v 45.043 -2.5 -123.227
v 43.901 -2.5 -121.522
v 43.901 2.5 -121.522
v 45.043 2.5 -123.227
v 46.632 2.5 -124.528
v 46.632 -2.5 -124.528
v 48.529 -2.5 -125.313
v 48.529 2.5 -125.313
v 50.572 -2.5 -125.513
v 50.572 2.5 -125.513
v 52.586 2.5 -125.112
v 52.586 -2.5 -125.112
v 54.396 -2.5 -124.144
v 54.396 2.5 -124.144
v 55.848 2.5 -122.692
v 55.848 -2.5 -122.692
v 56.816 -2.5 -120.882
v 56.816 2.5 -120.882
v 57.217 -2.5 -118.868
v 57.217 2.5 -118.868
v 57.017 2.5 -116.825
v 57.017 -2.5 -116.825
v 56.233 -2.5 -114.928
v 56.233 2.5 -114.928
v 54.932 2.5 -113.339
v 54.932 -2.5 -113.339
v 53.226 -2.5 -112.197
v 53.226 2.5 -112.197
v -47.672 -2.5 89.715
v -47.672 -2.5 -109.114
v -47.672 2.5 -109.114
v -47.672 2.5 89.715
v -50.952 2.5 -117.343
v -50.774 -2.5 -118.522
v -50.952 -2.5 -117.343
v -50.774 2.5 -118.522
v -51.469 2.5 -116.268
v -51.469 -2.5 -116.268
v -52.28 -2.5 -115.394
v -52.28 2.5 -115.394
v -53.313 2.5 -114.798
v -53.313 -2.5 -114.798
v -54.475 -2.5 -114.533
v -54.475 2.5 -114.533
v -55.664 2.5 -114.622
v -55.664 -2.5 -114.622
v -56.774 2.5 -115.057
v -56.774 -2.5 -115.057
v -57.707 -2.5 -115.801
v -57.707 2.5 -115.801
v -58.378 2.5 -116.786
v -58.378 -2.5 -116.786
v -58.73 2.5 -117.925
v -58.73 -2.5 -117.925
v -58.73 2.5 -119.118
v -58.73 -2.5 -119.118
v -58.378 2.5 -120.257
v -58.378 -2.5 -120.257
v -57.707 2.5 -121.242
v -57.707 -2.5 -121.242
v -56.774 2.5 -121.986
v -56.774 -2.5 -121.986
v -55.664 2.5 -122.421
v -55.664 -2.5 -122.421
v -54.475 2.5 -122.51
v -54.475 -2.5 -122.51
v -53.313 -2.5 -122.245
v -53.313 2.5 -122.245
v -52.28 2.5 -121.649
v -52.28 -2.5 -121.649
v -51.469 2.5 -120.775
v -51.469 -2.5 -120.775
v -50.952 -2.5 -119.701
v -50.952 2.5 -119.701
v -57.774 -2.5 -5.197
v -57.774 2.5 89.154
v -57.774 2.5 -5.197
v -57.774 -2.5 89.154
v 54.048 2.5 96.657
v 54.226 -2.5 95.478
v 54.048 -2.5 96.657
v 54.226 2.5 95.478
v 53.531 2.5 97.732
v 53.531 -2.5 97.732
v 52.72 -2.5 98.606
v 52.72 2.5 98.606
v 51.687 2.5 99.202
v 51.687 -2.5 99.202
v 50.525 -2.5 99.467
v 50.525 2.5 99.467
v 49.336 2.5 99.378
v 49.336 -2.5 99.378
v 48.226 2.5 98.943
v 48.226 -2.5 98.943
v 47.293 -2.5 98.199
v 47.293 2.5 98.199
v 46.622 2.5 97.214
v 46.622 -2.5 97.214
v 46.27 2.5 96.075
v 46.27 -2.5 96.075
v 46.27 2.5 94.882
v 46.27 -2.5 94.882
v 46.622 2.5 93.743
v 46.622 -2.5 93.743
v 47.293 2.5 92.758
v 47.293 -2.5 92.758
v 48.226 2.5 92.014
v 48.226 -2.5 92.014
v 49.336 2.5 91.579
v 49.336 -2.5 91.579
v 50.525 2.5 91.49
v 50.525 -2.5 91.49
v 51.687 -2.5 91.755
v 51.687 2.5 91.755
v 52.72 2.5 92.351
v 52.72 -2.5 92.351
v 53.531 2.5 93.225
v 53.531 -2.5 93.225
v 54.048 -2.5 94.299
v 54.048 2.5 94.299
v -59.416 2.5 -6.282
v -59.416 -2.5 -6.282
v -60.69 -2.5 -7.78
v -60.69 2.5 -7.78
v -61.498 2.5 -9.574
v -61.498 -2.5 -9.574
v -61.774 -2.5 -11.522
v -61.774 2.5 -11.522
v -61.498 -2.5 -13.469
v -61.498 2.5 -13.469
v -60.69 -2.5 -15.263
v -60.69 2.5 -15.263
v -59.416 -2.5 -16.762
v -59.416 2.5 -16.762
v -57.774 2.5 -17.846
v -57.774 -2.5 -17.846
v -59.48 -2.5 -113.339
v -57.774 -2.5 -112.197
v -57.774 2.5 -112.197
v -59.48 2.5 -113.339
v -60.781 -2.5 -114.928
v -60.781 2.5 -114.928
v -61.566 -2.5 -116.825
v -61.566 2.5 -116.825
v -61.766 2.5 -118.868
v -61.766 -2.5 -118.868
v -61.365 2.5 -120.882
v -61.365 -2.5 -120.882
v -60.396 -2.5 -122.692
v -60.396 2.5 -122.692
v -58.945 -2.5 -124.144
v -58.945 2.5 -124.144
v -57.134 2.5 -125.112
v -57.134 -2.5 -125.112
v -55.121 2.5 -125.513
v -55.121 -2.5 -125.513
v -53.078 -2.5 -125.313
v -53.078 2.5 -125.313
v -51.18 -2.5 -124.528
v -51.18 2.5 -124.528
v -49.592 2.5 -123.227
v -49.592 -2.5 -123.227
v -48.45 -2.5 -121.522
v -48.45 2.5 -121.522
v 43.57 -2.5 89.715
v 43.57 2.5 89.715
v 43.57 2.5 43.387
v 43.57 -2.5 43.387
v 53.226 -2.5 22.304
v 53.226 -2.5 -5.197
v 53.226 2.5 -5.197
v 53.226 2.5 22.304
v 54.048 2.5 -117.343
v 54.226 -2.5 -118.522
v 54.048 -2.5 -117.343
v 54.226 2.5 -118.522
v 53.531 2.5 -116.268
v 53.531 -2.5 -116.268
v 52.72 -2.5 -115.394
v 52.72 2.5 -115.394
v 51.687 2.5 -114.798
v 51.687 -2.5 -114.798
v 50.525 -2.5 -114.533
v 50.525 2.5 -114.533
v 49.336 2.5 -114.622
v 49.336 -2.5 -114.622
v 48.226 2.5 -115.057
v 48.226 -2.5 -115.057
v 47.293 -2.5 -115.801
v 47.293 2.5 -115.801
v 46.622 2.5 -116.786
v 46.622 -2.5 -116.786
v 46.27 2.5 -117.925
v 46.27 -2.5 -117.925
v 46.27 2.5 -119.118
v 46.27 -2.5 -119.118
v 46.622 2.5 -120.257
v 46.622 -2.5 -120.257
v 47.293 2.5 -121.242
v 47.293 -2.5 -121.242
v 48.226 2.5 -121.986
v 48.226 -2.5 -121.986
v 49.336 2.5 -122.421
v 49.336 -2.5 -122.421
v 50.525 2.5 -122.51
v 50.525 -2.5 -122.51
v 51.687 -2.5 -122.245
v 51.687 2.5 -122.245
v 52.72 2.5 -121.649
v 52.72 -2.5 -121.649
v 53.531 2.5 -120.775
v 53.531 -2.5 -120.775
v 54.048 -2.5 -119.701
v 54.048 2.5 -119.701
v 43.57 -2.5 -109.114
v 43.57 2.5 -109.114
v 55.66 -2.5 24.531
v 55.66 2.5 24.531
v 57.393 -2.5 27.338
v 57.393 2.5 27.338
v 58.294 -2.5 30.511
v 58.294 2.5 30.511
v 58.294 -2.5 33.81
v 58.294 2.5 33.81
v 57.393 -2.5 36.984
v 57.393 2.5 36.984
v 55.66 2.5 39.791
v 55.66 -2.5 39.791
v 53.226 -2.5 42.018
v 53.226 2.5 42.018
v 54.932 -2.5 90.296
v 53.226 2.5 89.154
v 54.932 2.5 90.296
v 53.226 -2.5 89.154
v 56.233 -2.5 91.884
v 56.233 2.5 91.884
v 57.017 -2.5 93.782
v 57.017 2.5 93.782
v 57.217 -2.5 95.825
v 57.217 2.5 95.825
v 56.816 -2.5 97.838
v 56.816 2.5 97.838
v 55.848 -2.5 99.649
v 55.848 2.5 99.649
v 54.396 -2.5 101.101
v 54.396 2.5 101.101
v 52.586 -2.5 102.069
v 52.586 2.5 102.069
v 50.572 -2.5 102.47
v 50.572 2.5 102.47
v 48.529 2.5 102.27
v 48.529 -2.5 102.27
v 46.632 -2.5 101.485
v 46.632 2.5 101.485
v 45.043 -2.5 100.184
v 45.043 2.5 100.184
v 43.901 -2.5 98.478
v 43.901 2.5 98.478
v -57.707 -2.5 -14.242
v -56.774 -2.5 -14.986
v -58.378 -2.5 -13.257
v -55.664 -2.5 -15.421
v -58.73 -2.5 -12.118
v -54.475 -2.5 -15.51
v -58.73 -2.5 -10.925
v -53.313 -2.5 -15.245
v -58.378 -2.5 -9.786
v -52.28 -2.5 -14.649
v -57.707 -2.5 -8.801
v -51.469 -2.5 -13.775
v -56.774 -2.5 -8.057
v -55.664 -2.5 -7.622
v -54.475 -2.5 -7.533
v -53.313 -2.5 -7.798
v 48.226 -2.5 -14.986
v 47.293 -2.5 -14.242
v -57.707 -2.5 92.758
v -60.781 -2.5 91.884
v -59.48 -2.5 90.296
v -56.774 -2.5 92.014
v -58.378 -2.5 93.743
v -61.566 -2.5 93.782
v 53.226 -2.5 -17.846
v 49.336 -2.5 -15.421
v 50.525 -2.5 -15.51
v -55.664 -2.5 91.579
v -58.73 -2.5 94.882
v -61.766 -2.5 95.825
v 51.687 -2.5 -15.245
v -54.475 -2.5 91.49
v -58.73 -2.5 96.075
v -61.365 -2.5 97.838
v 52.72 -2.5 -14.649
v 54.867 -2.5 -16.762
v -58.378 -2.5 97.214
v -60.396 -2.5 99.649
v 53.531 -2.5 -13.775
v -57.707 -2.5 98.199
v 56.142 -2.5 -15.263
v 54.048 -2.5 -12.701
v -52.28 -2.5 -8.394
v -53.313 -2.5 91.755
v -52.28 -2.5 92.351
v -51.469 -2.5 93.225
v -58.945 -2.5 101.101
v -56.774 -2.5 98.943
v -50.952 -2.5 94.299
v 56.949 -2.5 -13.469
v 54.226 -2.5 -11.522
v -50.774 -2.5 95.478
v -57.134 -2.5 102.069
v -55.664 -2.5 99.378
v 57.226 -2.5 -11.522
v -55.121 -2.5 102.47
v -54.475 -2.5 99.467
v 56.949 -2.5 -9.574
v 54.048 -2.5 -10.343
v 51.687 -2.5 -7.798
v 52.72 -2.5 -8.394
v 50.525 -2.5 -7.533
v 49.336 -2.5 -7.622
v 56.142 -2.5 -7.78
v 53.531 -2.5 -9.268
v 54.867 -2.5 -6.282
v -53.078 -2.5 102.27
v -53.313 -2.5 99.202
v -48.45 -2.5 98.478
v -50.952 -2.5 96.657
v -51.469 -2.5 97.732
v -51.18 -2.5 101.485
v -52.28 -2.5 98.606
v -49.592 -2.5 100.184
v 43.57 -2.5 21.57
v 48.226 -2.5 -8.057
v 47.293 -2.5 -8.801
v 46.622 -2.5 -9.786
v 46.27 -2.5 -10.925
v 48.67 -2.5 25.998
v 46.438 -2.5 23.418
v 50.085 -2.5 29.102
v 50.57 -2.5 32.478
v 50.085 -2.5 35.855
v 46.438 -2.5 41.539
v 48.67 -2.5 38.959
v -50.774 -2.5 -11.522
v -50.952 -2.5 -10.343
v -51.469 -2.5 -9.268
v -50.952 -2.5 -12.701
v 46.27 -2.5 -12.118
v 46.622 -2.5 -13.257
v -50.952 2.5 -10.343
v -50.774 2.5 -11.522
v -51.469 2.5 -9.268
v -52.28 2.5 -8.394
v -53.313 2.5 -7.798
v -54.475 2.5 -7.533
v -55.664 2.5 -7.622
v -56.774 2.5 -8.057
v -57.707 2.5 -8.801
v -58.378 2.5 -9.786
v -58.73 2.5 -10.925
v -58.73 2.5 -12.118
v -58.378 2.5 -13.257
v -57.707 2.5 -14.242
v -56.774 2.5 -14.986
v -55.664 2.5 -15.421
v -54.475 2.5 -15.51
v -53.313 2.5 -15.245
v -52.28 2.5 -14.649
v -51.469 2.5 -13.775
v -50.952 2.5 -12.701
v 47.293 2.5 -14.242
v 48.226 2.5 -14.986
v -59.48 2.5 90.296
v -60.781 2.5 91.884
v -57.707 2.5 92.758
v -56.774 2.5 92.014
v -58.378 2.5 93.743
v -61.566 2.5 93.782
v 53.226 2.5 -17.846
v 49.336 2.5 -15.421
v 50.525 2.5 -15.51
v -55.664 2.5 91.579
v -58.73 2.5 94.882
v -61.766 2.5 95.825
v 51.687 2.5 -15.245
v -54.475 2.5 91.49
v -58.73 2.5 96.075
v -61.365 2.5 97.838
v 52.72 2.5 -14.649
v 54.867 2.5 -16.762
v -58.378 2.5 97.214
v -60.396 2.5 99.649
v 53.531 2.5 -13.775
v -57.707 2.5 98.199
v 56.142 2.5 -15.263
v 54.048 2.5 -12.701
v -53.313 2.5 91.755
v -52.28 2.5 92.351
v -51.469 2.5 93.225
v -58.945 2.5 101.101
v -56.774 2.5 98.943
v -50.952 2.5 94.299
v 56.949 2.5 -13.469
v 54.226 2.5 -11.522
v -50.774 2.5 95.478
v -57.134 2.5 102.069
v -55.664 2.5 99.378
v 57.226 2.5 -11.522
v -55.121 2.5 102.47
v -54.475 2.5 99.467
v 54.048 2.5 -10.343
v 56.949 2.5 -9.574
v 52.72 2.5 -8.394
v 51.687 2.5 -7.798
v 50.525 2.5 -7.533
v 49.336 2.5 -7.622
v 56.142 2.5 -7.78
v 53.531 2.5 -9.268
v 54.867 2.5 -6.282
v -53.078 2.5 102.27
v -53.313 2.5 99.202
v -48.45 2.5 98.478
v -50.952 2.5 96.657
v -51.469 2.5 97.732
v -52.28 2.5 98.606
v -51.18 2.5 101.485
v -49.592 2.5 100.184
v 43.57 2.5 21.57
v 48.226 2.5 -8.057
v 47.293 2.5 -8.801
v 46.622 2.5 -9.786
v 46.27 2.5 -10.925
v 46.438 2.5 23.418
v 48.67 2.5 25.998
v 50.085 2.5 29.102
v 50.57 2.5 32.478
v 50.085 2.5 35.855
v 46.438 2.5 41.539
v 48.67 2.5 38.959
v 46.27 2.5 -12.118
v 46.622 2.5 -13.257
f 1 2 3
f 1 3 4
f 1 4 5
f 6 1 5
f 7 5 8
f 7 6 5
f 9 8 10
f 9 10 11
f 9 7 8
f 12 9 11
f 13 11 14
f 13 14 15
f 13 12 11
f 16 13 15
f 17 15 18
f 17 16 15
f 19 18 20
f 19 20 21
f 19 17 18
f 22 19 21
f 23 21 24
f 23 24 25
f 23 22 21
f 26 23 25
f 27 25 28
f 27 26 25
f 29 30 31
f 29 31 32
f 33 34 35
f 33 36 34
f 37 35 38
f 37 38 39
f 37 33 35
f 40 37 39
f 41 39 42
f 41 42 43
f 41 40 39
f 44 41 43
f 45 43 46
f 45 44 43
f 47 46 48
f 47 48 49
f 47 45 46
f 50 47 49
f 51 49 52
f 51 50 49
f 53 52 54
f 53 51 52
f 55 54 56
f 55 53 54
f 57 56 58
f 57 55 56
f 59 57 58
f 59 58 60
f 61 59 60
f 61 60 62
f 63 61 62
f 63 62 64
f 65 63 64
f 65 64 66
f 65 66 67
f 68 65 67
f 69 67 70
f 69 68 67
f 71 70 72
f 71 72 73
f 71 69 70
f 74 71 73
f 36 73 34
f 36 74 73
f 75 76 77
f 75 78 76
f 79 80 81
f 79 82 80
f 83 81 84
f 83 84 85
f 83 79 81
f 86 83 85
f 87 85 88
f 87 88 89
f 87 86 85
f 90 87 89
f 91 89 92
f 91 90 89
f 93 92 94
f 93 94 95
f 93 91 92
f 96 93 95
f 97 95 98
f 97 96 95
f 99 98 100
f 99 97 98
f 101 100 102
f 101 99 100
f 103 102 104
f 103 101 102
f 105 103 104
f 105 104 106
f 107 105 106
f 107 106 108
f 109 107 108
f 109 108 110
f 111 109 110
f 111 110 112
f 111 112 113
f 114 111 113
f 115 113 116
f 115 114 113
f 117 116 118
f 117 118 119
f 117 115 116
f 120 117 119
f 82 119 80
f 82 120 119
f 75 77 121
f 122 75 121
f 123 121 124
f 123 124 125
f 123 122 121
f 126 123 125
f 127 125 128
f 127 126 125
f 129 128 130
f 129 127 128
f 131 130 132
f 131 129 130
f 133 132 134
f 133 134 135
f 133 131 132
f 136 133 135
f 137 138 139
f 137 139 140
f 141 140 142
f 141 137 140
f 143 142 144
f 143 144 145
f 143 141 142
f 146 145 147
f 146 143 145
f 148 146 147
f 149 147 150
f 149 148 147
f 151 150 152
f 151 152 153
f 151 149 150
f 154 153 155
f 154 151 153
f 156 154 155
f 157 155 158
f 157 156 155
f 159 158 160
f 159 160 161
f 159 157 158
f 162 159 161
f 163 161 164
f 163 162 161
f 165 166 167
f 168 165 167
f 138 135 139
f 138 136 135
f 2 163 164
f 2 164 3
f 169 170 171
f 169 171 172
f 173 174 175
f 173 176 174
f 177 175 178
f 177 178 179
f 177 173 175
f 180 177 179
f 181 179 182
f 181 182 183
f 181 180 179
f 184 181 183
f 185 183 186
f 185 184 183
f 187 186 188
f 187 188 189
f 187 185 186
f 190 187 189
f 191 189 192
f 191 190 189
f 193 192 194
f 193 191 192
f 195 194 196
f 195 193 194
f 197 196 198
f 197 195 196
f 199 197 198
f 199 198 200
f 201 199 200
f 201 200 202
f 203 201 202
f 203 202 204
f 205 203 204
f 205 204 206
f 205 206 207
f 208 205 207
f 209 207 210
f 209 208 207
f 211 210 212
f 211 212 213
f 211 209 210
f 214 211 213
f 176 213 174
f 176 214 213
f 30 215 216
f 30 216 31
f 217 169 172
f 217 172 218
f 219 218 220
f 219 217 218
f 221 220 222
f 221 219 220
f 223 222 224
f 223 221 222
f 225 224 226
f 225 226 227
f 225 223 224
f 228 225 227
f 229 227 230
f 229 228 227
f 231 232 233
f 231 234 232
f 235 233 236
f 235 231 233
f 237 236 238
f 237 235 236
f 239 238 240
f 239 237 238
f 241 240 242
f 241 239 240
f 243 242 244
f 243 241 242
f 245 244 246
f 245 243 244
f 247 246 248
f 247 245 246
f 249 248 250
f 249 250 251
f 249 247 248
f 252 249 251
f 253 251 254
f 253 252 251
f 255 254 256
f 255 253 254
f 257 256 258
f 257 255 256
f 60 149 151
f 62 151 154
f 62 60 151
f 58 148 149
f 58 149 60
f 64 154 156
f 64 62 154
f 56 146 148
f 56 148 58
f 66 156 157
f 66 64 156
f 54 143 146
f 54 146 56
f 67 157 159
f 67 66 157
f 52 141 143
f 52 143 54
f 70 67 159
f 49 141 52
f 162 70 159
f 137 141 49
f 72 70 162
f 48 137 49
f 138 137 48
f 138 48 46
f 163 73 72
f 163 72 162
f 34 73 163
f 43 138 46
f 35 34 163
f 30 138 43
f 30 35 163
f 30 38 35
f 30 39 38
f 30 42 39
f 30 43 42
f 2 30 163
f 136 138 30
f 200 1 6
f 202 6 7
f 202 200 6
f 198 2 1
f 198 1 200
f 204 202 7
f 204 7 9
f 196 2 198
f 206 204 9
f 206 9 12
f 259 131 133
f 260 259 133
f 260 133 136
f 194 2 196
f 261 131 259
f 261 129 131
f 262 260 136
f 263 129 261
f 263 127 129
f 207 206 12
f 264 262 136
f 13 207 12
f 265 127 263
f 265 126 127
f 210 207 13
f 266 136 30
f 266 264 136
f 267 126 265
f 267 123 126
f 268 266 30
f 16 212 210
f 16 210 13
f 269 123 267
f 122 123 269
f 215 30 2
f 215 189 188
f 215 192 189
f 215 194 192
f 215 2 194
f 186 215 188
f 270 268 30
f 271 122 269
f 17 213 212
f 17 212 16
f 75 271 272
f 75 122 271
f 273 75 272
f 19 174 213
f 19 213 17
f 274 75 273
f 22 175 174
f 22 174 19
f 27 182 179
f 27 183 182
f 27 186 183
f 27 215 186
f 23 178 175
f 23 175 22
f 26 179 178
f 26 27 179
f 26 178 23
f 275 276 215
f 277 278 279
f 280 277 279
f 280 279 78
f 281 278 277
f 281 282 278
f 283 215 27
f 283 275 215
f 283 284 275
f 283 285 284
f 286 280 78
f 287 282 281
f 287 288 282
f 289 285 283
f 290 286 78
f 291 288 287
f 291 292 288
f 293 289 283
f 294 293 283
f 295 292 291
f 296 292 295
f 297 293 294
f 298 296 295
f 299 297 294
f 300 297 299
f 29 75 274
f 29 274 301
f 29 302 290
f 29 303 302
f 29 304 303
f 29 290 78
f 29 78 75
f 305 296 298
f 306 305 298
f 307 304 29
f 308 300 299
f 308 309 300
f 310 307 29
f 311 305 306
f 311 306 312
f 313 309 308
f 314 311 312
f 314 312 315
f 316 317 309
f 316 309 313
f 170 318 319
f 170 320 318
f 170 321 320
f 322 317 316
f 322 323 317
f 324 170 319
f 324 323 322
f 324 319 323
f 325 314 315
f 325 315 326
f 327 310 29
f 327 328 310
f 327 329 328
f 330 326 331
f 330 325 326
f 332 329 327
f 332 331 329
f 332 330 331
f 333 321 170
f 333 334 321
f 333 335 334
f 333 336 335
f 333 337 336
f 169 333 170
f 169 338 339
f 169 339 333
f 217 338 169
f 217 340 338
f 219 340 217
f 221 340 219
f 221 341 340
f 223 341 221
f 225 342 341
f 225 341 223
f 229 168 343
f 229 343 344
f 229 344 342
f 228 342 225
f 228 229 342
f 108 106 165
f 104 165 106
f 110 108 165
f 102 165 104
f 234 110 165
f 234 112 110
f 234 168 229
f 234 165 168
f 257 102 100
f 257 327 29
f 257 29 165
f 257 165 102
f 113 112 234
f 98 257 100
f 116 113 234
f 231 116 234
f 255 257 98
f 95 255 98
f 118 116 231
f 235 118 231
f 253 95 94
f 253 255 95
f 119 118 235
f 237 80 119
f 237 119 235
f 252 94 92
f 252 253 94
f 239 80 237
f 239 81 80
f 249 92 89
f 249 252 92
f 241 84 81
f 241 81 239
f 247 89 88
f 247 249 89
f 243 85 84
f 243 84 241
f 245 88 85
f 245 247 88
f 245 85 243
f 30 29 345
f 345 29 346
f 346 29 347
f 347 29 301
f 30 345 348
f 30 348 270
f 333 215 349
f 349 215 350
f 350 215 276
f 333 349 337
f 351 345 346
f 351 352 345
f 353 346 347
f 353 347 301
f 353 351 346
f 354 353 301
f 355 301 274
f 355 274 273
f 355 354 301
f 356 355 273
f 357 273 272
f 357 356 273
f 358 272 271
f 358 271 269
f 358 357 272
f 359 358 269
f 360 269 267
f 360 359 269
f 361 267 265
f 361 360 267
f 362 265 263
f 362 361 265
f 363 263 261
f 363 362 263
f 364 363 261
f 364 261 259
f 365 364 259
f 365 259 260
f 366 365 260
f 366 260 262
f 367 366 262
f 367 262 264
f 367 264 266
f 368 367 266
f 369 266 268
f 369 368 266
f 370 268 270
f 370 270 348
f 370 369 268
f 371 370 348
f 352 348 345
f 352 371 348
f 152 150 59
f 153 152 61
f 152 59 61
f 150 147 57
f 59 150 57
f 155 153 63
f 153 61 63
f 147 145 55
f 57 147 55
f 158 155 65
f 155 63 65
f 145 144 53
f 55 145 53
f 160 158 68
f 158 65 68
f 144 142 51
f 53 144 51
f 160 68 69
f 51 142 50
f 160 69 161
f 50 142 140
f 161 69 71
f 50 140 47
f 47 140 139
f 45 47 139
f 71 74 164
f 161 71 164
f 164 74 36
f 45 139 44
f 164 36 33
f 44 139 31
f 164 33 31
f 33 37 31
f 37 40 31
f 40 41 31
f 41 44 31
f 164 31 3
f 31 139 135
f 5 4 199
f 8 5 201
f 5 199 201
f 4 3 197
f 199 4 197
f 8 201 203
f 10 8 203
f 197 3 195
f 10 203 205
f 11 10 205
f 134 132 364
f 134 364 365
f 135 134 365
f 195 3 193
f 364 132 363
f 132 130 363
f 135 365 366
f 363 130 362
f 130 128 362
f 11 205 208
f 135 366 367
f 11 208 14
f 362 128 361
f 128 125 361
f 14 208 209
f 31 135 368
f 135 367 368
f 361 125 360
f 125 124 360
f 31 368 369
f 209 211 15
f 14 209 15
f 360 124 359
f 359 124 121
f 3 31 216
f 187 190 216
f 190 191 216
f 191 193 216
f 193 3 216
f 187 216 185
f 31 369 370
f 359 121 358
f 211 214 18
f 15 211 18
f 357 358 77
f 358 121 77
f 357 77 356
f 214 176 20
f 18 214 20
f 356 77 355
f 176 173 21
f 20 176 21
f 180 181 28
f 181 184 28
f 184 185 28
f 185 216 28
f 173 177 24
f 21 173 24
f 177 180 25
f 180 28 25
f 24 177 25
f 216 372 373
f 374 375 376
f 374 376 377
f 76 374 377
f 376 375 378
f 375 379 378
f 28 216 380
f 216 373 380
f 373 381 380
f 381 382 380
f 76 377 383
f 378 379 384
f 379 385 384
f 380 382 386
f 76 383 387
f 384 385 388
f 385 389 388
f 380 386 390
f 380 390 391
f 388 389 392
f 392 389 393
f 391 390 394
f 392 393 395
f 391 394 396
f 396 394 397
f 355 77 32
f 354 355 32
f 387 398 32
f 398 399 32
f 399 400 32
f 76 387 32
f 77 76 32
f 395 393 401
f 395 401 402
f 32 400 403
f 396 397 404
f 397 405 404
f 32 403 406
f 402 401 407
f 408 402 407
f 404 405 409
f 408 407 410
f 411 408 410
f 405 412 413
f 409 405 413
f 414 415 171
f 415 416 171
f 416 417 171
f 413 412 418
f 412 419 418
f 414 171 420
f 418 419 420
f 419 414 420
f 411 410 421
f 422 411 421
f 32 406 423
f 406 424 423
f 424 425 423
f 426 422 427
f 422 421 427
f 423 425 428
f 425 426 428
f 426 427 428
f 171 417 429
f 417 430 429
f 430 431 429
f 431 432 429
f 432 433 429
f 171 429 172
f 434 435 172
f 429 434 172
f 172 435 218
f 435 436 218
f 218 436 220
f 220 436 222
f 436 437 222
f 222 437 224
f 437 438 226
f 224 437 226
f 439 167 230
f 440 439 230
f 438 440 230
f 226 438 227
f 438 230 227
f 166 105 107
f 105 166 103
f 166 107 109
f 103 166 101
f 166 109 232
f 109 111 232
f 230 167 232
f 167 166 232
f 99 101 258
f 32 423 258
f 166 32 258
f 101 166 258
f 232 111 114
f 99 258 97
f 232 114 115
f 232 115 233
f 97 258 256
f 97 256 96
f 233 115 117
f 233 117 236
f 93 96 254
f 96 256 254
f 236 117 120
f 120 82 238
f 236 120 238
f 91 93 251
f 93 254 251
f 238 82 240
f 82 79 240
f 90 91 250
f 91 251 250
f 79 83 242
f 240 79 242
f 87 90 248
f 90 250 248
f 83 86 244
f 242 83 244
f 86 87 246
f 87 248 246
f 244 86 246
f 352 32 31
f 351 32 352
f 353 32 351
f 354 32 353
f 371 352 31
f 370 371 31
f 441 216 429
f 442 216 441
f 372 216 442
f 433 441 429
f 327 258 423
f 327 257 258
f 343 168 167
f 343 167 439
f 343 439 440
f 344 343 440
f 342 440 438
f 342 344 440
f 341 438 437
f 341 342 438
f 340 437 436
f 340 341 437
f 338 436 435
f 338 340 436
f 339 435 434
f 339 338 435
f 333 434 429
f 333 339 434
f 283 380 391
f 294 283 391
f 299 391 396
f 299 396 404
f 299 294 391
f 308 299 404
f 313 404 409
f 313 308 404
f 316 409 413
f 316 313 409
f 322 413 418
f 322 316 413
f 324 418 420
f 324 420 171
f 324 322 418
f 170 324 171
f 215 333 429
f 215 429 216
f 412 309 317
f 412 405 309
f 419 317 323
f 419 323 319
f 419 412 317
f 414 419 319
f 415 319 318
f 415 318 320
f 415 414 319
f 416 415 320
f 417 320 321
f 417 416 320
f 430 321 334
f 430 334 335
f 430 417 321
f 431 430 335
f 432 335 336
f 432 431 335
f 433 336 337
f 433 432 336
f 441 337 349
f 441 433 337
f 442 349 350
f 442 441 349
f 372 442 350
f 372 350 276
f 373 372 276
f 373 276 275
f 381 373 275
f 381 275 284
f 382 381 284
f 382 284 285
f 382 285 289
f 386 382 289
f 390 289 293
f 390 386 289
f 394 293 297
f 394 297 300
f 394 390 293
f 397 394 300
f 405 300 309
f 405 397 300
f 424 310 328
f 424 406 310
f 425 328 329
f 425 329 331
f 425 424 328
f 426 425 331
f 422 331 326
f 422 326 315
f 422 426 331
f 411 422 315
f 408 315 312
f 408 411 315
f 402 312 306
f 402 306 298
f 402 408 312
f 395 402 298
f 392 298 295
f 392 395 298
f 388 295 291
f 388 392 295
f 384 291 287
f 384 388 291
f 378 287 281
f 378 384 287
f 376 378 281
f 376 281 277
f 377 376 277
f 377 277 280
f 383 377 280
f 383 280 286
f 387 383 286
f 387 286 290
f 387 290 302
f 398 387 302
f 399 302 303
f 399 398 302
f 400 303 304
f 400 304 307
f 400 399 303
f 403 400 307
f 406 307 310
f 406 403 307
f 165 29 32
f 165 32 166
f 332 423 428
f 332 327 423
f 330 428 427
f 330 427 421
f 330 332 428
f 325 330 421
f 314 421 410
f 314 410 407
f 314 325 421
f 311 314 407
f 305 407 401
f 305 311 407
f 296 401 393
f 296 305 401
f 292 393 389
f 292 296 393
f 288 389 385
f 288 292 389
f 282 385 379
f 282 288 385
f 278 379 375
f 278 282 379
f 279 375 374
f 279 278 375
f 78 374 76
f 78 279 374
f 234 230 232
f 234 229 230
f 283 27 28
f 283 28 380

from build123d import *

# Parameters (mm, degrees)
F0_R     = 4
F1_DEPTH = 2.5


with BuildPart() as f1:
    # F0 (on Front) → F1 (new body, symmetric)
    with BuildSketch(Plane.XZ):
        with BuildLine():
            Line((-57.774334, -17.846146), (-57.774334, -112.197036))
            ThreePointArc((-57.774334, -112.197036), (-59.724081, -123.471338), (-48.449779, -121.521591))
            Line((-48.449779, -121.521591), (43.901111, -121.521591))
            ThreePointArc((43.901111, -121.521591), (55.175413, -123.471338), (53.225666, -112.197036))
            Line((53.225666, -112.197036), (53.225666, -17.846146))
            ThreePointArc((53.225666, -17.846146), (57.225666, -11.521591), (53.225666, -5.197036))
            Line((53.225666, -5.197036), (53.225666, 22.303822))
            ThreePointArc((53.225666, 22.303822), (58.408131, 32.160811), (53.225666, 42.017801))
            Line((53.225666, 42.017801), (53.225666, 89.153854))
            ThreePointArc((53.225666, 89.153854), (55.175413, 100.428157), (43.901111, 98.478409))
            Line((43.901111, 98.478409), (-48.449779, 98.478409))
            ThreePointArc((-48.449779, 98.478409), (-59.724081, 100.428157), (-57.774334, 89.153854))
            Line((-57.774334, 89.153854), (-57.774334, -5.197036))
            ThreePointArc((-57.774334, -5.197036), (-61.774334, -11.521591), (-57.774334, -17.846146))
        make_face()
        with Locations((-54.774334, -118.521591)):
            Circle(F0_R, mode=Mode.SUBTRACT)
        with Locations((50.225666, -118.521591)):
            Circle(F0_R, mode=Mode.SUBTRACT)
        with Locations((-54.774334, -11.521591)):
            Circle(F0_R, mode=Mode.SUBTRACT)
        with Locations((-54.774334, 95.478409)):
            Circle(F0_R, mode=Mode.SUBTRACT)
        with BuildLine():
            Line((-47.672213, -109.113894), (-47.672213, 89.714533))
            Line((-47.672213, 89.714533), (43.570419, 89.714533))
            Line((43.570419, 89.714533), (43.570419, 43.387121))
            ThreePointArc((43.570419, 43.387121), (50.570419, 32.478409), (43.570419, 21.569697))
            Line((43.570419, 21.569697), (43.570419, -109.113894))
            Line((43.570419, -109.113894), (-47.672213, -109.113894))
        make_face(mode=Mode.SUBTRACT)
        with Locations((50.225666, -11.521591)):
            Circle(F0_R, mode=Mode.SUBTRACT)
        with Locations((50.225666, 95.478409)):
            Circle(F0_R, mode=Mode.SUBTRACT)
    extrude(amount=F1_DEPTH, both=True)


solid = f1.part
